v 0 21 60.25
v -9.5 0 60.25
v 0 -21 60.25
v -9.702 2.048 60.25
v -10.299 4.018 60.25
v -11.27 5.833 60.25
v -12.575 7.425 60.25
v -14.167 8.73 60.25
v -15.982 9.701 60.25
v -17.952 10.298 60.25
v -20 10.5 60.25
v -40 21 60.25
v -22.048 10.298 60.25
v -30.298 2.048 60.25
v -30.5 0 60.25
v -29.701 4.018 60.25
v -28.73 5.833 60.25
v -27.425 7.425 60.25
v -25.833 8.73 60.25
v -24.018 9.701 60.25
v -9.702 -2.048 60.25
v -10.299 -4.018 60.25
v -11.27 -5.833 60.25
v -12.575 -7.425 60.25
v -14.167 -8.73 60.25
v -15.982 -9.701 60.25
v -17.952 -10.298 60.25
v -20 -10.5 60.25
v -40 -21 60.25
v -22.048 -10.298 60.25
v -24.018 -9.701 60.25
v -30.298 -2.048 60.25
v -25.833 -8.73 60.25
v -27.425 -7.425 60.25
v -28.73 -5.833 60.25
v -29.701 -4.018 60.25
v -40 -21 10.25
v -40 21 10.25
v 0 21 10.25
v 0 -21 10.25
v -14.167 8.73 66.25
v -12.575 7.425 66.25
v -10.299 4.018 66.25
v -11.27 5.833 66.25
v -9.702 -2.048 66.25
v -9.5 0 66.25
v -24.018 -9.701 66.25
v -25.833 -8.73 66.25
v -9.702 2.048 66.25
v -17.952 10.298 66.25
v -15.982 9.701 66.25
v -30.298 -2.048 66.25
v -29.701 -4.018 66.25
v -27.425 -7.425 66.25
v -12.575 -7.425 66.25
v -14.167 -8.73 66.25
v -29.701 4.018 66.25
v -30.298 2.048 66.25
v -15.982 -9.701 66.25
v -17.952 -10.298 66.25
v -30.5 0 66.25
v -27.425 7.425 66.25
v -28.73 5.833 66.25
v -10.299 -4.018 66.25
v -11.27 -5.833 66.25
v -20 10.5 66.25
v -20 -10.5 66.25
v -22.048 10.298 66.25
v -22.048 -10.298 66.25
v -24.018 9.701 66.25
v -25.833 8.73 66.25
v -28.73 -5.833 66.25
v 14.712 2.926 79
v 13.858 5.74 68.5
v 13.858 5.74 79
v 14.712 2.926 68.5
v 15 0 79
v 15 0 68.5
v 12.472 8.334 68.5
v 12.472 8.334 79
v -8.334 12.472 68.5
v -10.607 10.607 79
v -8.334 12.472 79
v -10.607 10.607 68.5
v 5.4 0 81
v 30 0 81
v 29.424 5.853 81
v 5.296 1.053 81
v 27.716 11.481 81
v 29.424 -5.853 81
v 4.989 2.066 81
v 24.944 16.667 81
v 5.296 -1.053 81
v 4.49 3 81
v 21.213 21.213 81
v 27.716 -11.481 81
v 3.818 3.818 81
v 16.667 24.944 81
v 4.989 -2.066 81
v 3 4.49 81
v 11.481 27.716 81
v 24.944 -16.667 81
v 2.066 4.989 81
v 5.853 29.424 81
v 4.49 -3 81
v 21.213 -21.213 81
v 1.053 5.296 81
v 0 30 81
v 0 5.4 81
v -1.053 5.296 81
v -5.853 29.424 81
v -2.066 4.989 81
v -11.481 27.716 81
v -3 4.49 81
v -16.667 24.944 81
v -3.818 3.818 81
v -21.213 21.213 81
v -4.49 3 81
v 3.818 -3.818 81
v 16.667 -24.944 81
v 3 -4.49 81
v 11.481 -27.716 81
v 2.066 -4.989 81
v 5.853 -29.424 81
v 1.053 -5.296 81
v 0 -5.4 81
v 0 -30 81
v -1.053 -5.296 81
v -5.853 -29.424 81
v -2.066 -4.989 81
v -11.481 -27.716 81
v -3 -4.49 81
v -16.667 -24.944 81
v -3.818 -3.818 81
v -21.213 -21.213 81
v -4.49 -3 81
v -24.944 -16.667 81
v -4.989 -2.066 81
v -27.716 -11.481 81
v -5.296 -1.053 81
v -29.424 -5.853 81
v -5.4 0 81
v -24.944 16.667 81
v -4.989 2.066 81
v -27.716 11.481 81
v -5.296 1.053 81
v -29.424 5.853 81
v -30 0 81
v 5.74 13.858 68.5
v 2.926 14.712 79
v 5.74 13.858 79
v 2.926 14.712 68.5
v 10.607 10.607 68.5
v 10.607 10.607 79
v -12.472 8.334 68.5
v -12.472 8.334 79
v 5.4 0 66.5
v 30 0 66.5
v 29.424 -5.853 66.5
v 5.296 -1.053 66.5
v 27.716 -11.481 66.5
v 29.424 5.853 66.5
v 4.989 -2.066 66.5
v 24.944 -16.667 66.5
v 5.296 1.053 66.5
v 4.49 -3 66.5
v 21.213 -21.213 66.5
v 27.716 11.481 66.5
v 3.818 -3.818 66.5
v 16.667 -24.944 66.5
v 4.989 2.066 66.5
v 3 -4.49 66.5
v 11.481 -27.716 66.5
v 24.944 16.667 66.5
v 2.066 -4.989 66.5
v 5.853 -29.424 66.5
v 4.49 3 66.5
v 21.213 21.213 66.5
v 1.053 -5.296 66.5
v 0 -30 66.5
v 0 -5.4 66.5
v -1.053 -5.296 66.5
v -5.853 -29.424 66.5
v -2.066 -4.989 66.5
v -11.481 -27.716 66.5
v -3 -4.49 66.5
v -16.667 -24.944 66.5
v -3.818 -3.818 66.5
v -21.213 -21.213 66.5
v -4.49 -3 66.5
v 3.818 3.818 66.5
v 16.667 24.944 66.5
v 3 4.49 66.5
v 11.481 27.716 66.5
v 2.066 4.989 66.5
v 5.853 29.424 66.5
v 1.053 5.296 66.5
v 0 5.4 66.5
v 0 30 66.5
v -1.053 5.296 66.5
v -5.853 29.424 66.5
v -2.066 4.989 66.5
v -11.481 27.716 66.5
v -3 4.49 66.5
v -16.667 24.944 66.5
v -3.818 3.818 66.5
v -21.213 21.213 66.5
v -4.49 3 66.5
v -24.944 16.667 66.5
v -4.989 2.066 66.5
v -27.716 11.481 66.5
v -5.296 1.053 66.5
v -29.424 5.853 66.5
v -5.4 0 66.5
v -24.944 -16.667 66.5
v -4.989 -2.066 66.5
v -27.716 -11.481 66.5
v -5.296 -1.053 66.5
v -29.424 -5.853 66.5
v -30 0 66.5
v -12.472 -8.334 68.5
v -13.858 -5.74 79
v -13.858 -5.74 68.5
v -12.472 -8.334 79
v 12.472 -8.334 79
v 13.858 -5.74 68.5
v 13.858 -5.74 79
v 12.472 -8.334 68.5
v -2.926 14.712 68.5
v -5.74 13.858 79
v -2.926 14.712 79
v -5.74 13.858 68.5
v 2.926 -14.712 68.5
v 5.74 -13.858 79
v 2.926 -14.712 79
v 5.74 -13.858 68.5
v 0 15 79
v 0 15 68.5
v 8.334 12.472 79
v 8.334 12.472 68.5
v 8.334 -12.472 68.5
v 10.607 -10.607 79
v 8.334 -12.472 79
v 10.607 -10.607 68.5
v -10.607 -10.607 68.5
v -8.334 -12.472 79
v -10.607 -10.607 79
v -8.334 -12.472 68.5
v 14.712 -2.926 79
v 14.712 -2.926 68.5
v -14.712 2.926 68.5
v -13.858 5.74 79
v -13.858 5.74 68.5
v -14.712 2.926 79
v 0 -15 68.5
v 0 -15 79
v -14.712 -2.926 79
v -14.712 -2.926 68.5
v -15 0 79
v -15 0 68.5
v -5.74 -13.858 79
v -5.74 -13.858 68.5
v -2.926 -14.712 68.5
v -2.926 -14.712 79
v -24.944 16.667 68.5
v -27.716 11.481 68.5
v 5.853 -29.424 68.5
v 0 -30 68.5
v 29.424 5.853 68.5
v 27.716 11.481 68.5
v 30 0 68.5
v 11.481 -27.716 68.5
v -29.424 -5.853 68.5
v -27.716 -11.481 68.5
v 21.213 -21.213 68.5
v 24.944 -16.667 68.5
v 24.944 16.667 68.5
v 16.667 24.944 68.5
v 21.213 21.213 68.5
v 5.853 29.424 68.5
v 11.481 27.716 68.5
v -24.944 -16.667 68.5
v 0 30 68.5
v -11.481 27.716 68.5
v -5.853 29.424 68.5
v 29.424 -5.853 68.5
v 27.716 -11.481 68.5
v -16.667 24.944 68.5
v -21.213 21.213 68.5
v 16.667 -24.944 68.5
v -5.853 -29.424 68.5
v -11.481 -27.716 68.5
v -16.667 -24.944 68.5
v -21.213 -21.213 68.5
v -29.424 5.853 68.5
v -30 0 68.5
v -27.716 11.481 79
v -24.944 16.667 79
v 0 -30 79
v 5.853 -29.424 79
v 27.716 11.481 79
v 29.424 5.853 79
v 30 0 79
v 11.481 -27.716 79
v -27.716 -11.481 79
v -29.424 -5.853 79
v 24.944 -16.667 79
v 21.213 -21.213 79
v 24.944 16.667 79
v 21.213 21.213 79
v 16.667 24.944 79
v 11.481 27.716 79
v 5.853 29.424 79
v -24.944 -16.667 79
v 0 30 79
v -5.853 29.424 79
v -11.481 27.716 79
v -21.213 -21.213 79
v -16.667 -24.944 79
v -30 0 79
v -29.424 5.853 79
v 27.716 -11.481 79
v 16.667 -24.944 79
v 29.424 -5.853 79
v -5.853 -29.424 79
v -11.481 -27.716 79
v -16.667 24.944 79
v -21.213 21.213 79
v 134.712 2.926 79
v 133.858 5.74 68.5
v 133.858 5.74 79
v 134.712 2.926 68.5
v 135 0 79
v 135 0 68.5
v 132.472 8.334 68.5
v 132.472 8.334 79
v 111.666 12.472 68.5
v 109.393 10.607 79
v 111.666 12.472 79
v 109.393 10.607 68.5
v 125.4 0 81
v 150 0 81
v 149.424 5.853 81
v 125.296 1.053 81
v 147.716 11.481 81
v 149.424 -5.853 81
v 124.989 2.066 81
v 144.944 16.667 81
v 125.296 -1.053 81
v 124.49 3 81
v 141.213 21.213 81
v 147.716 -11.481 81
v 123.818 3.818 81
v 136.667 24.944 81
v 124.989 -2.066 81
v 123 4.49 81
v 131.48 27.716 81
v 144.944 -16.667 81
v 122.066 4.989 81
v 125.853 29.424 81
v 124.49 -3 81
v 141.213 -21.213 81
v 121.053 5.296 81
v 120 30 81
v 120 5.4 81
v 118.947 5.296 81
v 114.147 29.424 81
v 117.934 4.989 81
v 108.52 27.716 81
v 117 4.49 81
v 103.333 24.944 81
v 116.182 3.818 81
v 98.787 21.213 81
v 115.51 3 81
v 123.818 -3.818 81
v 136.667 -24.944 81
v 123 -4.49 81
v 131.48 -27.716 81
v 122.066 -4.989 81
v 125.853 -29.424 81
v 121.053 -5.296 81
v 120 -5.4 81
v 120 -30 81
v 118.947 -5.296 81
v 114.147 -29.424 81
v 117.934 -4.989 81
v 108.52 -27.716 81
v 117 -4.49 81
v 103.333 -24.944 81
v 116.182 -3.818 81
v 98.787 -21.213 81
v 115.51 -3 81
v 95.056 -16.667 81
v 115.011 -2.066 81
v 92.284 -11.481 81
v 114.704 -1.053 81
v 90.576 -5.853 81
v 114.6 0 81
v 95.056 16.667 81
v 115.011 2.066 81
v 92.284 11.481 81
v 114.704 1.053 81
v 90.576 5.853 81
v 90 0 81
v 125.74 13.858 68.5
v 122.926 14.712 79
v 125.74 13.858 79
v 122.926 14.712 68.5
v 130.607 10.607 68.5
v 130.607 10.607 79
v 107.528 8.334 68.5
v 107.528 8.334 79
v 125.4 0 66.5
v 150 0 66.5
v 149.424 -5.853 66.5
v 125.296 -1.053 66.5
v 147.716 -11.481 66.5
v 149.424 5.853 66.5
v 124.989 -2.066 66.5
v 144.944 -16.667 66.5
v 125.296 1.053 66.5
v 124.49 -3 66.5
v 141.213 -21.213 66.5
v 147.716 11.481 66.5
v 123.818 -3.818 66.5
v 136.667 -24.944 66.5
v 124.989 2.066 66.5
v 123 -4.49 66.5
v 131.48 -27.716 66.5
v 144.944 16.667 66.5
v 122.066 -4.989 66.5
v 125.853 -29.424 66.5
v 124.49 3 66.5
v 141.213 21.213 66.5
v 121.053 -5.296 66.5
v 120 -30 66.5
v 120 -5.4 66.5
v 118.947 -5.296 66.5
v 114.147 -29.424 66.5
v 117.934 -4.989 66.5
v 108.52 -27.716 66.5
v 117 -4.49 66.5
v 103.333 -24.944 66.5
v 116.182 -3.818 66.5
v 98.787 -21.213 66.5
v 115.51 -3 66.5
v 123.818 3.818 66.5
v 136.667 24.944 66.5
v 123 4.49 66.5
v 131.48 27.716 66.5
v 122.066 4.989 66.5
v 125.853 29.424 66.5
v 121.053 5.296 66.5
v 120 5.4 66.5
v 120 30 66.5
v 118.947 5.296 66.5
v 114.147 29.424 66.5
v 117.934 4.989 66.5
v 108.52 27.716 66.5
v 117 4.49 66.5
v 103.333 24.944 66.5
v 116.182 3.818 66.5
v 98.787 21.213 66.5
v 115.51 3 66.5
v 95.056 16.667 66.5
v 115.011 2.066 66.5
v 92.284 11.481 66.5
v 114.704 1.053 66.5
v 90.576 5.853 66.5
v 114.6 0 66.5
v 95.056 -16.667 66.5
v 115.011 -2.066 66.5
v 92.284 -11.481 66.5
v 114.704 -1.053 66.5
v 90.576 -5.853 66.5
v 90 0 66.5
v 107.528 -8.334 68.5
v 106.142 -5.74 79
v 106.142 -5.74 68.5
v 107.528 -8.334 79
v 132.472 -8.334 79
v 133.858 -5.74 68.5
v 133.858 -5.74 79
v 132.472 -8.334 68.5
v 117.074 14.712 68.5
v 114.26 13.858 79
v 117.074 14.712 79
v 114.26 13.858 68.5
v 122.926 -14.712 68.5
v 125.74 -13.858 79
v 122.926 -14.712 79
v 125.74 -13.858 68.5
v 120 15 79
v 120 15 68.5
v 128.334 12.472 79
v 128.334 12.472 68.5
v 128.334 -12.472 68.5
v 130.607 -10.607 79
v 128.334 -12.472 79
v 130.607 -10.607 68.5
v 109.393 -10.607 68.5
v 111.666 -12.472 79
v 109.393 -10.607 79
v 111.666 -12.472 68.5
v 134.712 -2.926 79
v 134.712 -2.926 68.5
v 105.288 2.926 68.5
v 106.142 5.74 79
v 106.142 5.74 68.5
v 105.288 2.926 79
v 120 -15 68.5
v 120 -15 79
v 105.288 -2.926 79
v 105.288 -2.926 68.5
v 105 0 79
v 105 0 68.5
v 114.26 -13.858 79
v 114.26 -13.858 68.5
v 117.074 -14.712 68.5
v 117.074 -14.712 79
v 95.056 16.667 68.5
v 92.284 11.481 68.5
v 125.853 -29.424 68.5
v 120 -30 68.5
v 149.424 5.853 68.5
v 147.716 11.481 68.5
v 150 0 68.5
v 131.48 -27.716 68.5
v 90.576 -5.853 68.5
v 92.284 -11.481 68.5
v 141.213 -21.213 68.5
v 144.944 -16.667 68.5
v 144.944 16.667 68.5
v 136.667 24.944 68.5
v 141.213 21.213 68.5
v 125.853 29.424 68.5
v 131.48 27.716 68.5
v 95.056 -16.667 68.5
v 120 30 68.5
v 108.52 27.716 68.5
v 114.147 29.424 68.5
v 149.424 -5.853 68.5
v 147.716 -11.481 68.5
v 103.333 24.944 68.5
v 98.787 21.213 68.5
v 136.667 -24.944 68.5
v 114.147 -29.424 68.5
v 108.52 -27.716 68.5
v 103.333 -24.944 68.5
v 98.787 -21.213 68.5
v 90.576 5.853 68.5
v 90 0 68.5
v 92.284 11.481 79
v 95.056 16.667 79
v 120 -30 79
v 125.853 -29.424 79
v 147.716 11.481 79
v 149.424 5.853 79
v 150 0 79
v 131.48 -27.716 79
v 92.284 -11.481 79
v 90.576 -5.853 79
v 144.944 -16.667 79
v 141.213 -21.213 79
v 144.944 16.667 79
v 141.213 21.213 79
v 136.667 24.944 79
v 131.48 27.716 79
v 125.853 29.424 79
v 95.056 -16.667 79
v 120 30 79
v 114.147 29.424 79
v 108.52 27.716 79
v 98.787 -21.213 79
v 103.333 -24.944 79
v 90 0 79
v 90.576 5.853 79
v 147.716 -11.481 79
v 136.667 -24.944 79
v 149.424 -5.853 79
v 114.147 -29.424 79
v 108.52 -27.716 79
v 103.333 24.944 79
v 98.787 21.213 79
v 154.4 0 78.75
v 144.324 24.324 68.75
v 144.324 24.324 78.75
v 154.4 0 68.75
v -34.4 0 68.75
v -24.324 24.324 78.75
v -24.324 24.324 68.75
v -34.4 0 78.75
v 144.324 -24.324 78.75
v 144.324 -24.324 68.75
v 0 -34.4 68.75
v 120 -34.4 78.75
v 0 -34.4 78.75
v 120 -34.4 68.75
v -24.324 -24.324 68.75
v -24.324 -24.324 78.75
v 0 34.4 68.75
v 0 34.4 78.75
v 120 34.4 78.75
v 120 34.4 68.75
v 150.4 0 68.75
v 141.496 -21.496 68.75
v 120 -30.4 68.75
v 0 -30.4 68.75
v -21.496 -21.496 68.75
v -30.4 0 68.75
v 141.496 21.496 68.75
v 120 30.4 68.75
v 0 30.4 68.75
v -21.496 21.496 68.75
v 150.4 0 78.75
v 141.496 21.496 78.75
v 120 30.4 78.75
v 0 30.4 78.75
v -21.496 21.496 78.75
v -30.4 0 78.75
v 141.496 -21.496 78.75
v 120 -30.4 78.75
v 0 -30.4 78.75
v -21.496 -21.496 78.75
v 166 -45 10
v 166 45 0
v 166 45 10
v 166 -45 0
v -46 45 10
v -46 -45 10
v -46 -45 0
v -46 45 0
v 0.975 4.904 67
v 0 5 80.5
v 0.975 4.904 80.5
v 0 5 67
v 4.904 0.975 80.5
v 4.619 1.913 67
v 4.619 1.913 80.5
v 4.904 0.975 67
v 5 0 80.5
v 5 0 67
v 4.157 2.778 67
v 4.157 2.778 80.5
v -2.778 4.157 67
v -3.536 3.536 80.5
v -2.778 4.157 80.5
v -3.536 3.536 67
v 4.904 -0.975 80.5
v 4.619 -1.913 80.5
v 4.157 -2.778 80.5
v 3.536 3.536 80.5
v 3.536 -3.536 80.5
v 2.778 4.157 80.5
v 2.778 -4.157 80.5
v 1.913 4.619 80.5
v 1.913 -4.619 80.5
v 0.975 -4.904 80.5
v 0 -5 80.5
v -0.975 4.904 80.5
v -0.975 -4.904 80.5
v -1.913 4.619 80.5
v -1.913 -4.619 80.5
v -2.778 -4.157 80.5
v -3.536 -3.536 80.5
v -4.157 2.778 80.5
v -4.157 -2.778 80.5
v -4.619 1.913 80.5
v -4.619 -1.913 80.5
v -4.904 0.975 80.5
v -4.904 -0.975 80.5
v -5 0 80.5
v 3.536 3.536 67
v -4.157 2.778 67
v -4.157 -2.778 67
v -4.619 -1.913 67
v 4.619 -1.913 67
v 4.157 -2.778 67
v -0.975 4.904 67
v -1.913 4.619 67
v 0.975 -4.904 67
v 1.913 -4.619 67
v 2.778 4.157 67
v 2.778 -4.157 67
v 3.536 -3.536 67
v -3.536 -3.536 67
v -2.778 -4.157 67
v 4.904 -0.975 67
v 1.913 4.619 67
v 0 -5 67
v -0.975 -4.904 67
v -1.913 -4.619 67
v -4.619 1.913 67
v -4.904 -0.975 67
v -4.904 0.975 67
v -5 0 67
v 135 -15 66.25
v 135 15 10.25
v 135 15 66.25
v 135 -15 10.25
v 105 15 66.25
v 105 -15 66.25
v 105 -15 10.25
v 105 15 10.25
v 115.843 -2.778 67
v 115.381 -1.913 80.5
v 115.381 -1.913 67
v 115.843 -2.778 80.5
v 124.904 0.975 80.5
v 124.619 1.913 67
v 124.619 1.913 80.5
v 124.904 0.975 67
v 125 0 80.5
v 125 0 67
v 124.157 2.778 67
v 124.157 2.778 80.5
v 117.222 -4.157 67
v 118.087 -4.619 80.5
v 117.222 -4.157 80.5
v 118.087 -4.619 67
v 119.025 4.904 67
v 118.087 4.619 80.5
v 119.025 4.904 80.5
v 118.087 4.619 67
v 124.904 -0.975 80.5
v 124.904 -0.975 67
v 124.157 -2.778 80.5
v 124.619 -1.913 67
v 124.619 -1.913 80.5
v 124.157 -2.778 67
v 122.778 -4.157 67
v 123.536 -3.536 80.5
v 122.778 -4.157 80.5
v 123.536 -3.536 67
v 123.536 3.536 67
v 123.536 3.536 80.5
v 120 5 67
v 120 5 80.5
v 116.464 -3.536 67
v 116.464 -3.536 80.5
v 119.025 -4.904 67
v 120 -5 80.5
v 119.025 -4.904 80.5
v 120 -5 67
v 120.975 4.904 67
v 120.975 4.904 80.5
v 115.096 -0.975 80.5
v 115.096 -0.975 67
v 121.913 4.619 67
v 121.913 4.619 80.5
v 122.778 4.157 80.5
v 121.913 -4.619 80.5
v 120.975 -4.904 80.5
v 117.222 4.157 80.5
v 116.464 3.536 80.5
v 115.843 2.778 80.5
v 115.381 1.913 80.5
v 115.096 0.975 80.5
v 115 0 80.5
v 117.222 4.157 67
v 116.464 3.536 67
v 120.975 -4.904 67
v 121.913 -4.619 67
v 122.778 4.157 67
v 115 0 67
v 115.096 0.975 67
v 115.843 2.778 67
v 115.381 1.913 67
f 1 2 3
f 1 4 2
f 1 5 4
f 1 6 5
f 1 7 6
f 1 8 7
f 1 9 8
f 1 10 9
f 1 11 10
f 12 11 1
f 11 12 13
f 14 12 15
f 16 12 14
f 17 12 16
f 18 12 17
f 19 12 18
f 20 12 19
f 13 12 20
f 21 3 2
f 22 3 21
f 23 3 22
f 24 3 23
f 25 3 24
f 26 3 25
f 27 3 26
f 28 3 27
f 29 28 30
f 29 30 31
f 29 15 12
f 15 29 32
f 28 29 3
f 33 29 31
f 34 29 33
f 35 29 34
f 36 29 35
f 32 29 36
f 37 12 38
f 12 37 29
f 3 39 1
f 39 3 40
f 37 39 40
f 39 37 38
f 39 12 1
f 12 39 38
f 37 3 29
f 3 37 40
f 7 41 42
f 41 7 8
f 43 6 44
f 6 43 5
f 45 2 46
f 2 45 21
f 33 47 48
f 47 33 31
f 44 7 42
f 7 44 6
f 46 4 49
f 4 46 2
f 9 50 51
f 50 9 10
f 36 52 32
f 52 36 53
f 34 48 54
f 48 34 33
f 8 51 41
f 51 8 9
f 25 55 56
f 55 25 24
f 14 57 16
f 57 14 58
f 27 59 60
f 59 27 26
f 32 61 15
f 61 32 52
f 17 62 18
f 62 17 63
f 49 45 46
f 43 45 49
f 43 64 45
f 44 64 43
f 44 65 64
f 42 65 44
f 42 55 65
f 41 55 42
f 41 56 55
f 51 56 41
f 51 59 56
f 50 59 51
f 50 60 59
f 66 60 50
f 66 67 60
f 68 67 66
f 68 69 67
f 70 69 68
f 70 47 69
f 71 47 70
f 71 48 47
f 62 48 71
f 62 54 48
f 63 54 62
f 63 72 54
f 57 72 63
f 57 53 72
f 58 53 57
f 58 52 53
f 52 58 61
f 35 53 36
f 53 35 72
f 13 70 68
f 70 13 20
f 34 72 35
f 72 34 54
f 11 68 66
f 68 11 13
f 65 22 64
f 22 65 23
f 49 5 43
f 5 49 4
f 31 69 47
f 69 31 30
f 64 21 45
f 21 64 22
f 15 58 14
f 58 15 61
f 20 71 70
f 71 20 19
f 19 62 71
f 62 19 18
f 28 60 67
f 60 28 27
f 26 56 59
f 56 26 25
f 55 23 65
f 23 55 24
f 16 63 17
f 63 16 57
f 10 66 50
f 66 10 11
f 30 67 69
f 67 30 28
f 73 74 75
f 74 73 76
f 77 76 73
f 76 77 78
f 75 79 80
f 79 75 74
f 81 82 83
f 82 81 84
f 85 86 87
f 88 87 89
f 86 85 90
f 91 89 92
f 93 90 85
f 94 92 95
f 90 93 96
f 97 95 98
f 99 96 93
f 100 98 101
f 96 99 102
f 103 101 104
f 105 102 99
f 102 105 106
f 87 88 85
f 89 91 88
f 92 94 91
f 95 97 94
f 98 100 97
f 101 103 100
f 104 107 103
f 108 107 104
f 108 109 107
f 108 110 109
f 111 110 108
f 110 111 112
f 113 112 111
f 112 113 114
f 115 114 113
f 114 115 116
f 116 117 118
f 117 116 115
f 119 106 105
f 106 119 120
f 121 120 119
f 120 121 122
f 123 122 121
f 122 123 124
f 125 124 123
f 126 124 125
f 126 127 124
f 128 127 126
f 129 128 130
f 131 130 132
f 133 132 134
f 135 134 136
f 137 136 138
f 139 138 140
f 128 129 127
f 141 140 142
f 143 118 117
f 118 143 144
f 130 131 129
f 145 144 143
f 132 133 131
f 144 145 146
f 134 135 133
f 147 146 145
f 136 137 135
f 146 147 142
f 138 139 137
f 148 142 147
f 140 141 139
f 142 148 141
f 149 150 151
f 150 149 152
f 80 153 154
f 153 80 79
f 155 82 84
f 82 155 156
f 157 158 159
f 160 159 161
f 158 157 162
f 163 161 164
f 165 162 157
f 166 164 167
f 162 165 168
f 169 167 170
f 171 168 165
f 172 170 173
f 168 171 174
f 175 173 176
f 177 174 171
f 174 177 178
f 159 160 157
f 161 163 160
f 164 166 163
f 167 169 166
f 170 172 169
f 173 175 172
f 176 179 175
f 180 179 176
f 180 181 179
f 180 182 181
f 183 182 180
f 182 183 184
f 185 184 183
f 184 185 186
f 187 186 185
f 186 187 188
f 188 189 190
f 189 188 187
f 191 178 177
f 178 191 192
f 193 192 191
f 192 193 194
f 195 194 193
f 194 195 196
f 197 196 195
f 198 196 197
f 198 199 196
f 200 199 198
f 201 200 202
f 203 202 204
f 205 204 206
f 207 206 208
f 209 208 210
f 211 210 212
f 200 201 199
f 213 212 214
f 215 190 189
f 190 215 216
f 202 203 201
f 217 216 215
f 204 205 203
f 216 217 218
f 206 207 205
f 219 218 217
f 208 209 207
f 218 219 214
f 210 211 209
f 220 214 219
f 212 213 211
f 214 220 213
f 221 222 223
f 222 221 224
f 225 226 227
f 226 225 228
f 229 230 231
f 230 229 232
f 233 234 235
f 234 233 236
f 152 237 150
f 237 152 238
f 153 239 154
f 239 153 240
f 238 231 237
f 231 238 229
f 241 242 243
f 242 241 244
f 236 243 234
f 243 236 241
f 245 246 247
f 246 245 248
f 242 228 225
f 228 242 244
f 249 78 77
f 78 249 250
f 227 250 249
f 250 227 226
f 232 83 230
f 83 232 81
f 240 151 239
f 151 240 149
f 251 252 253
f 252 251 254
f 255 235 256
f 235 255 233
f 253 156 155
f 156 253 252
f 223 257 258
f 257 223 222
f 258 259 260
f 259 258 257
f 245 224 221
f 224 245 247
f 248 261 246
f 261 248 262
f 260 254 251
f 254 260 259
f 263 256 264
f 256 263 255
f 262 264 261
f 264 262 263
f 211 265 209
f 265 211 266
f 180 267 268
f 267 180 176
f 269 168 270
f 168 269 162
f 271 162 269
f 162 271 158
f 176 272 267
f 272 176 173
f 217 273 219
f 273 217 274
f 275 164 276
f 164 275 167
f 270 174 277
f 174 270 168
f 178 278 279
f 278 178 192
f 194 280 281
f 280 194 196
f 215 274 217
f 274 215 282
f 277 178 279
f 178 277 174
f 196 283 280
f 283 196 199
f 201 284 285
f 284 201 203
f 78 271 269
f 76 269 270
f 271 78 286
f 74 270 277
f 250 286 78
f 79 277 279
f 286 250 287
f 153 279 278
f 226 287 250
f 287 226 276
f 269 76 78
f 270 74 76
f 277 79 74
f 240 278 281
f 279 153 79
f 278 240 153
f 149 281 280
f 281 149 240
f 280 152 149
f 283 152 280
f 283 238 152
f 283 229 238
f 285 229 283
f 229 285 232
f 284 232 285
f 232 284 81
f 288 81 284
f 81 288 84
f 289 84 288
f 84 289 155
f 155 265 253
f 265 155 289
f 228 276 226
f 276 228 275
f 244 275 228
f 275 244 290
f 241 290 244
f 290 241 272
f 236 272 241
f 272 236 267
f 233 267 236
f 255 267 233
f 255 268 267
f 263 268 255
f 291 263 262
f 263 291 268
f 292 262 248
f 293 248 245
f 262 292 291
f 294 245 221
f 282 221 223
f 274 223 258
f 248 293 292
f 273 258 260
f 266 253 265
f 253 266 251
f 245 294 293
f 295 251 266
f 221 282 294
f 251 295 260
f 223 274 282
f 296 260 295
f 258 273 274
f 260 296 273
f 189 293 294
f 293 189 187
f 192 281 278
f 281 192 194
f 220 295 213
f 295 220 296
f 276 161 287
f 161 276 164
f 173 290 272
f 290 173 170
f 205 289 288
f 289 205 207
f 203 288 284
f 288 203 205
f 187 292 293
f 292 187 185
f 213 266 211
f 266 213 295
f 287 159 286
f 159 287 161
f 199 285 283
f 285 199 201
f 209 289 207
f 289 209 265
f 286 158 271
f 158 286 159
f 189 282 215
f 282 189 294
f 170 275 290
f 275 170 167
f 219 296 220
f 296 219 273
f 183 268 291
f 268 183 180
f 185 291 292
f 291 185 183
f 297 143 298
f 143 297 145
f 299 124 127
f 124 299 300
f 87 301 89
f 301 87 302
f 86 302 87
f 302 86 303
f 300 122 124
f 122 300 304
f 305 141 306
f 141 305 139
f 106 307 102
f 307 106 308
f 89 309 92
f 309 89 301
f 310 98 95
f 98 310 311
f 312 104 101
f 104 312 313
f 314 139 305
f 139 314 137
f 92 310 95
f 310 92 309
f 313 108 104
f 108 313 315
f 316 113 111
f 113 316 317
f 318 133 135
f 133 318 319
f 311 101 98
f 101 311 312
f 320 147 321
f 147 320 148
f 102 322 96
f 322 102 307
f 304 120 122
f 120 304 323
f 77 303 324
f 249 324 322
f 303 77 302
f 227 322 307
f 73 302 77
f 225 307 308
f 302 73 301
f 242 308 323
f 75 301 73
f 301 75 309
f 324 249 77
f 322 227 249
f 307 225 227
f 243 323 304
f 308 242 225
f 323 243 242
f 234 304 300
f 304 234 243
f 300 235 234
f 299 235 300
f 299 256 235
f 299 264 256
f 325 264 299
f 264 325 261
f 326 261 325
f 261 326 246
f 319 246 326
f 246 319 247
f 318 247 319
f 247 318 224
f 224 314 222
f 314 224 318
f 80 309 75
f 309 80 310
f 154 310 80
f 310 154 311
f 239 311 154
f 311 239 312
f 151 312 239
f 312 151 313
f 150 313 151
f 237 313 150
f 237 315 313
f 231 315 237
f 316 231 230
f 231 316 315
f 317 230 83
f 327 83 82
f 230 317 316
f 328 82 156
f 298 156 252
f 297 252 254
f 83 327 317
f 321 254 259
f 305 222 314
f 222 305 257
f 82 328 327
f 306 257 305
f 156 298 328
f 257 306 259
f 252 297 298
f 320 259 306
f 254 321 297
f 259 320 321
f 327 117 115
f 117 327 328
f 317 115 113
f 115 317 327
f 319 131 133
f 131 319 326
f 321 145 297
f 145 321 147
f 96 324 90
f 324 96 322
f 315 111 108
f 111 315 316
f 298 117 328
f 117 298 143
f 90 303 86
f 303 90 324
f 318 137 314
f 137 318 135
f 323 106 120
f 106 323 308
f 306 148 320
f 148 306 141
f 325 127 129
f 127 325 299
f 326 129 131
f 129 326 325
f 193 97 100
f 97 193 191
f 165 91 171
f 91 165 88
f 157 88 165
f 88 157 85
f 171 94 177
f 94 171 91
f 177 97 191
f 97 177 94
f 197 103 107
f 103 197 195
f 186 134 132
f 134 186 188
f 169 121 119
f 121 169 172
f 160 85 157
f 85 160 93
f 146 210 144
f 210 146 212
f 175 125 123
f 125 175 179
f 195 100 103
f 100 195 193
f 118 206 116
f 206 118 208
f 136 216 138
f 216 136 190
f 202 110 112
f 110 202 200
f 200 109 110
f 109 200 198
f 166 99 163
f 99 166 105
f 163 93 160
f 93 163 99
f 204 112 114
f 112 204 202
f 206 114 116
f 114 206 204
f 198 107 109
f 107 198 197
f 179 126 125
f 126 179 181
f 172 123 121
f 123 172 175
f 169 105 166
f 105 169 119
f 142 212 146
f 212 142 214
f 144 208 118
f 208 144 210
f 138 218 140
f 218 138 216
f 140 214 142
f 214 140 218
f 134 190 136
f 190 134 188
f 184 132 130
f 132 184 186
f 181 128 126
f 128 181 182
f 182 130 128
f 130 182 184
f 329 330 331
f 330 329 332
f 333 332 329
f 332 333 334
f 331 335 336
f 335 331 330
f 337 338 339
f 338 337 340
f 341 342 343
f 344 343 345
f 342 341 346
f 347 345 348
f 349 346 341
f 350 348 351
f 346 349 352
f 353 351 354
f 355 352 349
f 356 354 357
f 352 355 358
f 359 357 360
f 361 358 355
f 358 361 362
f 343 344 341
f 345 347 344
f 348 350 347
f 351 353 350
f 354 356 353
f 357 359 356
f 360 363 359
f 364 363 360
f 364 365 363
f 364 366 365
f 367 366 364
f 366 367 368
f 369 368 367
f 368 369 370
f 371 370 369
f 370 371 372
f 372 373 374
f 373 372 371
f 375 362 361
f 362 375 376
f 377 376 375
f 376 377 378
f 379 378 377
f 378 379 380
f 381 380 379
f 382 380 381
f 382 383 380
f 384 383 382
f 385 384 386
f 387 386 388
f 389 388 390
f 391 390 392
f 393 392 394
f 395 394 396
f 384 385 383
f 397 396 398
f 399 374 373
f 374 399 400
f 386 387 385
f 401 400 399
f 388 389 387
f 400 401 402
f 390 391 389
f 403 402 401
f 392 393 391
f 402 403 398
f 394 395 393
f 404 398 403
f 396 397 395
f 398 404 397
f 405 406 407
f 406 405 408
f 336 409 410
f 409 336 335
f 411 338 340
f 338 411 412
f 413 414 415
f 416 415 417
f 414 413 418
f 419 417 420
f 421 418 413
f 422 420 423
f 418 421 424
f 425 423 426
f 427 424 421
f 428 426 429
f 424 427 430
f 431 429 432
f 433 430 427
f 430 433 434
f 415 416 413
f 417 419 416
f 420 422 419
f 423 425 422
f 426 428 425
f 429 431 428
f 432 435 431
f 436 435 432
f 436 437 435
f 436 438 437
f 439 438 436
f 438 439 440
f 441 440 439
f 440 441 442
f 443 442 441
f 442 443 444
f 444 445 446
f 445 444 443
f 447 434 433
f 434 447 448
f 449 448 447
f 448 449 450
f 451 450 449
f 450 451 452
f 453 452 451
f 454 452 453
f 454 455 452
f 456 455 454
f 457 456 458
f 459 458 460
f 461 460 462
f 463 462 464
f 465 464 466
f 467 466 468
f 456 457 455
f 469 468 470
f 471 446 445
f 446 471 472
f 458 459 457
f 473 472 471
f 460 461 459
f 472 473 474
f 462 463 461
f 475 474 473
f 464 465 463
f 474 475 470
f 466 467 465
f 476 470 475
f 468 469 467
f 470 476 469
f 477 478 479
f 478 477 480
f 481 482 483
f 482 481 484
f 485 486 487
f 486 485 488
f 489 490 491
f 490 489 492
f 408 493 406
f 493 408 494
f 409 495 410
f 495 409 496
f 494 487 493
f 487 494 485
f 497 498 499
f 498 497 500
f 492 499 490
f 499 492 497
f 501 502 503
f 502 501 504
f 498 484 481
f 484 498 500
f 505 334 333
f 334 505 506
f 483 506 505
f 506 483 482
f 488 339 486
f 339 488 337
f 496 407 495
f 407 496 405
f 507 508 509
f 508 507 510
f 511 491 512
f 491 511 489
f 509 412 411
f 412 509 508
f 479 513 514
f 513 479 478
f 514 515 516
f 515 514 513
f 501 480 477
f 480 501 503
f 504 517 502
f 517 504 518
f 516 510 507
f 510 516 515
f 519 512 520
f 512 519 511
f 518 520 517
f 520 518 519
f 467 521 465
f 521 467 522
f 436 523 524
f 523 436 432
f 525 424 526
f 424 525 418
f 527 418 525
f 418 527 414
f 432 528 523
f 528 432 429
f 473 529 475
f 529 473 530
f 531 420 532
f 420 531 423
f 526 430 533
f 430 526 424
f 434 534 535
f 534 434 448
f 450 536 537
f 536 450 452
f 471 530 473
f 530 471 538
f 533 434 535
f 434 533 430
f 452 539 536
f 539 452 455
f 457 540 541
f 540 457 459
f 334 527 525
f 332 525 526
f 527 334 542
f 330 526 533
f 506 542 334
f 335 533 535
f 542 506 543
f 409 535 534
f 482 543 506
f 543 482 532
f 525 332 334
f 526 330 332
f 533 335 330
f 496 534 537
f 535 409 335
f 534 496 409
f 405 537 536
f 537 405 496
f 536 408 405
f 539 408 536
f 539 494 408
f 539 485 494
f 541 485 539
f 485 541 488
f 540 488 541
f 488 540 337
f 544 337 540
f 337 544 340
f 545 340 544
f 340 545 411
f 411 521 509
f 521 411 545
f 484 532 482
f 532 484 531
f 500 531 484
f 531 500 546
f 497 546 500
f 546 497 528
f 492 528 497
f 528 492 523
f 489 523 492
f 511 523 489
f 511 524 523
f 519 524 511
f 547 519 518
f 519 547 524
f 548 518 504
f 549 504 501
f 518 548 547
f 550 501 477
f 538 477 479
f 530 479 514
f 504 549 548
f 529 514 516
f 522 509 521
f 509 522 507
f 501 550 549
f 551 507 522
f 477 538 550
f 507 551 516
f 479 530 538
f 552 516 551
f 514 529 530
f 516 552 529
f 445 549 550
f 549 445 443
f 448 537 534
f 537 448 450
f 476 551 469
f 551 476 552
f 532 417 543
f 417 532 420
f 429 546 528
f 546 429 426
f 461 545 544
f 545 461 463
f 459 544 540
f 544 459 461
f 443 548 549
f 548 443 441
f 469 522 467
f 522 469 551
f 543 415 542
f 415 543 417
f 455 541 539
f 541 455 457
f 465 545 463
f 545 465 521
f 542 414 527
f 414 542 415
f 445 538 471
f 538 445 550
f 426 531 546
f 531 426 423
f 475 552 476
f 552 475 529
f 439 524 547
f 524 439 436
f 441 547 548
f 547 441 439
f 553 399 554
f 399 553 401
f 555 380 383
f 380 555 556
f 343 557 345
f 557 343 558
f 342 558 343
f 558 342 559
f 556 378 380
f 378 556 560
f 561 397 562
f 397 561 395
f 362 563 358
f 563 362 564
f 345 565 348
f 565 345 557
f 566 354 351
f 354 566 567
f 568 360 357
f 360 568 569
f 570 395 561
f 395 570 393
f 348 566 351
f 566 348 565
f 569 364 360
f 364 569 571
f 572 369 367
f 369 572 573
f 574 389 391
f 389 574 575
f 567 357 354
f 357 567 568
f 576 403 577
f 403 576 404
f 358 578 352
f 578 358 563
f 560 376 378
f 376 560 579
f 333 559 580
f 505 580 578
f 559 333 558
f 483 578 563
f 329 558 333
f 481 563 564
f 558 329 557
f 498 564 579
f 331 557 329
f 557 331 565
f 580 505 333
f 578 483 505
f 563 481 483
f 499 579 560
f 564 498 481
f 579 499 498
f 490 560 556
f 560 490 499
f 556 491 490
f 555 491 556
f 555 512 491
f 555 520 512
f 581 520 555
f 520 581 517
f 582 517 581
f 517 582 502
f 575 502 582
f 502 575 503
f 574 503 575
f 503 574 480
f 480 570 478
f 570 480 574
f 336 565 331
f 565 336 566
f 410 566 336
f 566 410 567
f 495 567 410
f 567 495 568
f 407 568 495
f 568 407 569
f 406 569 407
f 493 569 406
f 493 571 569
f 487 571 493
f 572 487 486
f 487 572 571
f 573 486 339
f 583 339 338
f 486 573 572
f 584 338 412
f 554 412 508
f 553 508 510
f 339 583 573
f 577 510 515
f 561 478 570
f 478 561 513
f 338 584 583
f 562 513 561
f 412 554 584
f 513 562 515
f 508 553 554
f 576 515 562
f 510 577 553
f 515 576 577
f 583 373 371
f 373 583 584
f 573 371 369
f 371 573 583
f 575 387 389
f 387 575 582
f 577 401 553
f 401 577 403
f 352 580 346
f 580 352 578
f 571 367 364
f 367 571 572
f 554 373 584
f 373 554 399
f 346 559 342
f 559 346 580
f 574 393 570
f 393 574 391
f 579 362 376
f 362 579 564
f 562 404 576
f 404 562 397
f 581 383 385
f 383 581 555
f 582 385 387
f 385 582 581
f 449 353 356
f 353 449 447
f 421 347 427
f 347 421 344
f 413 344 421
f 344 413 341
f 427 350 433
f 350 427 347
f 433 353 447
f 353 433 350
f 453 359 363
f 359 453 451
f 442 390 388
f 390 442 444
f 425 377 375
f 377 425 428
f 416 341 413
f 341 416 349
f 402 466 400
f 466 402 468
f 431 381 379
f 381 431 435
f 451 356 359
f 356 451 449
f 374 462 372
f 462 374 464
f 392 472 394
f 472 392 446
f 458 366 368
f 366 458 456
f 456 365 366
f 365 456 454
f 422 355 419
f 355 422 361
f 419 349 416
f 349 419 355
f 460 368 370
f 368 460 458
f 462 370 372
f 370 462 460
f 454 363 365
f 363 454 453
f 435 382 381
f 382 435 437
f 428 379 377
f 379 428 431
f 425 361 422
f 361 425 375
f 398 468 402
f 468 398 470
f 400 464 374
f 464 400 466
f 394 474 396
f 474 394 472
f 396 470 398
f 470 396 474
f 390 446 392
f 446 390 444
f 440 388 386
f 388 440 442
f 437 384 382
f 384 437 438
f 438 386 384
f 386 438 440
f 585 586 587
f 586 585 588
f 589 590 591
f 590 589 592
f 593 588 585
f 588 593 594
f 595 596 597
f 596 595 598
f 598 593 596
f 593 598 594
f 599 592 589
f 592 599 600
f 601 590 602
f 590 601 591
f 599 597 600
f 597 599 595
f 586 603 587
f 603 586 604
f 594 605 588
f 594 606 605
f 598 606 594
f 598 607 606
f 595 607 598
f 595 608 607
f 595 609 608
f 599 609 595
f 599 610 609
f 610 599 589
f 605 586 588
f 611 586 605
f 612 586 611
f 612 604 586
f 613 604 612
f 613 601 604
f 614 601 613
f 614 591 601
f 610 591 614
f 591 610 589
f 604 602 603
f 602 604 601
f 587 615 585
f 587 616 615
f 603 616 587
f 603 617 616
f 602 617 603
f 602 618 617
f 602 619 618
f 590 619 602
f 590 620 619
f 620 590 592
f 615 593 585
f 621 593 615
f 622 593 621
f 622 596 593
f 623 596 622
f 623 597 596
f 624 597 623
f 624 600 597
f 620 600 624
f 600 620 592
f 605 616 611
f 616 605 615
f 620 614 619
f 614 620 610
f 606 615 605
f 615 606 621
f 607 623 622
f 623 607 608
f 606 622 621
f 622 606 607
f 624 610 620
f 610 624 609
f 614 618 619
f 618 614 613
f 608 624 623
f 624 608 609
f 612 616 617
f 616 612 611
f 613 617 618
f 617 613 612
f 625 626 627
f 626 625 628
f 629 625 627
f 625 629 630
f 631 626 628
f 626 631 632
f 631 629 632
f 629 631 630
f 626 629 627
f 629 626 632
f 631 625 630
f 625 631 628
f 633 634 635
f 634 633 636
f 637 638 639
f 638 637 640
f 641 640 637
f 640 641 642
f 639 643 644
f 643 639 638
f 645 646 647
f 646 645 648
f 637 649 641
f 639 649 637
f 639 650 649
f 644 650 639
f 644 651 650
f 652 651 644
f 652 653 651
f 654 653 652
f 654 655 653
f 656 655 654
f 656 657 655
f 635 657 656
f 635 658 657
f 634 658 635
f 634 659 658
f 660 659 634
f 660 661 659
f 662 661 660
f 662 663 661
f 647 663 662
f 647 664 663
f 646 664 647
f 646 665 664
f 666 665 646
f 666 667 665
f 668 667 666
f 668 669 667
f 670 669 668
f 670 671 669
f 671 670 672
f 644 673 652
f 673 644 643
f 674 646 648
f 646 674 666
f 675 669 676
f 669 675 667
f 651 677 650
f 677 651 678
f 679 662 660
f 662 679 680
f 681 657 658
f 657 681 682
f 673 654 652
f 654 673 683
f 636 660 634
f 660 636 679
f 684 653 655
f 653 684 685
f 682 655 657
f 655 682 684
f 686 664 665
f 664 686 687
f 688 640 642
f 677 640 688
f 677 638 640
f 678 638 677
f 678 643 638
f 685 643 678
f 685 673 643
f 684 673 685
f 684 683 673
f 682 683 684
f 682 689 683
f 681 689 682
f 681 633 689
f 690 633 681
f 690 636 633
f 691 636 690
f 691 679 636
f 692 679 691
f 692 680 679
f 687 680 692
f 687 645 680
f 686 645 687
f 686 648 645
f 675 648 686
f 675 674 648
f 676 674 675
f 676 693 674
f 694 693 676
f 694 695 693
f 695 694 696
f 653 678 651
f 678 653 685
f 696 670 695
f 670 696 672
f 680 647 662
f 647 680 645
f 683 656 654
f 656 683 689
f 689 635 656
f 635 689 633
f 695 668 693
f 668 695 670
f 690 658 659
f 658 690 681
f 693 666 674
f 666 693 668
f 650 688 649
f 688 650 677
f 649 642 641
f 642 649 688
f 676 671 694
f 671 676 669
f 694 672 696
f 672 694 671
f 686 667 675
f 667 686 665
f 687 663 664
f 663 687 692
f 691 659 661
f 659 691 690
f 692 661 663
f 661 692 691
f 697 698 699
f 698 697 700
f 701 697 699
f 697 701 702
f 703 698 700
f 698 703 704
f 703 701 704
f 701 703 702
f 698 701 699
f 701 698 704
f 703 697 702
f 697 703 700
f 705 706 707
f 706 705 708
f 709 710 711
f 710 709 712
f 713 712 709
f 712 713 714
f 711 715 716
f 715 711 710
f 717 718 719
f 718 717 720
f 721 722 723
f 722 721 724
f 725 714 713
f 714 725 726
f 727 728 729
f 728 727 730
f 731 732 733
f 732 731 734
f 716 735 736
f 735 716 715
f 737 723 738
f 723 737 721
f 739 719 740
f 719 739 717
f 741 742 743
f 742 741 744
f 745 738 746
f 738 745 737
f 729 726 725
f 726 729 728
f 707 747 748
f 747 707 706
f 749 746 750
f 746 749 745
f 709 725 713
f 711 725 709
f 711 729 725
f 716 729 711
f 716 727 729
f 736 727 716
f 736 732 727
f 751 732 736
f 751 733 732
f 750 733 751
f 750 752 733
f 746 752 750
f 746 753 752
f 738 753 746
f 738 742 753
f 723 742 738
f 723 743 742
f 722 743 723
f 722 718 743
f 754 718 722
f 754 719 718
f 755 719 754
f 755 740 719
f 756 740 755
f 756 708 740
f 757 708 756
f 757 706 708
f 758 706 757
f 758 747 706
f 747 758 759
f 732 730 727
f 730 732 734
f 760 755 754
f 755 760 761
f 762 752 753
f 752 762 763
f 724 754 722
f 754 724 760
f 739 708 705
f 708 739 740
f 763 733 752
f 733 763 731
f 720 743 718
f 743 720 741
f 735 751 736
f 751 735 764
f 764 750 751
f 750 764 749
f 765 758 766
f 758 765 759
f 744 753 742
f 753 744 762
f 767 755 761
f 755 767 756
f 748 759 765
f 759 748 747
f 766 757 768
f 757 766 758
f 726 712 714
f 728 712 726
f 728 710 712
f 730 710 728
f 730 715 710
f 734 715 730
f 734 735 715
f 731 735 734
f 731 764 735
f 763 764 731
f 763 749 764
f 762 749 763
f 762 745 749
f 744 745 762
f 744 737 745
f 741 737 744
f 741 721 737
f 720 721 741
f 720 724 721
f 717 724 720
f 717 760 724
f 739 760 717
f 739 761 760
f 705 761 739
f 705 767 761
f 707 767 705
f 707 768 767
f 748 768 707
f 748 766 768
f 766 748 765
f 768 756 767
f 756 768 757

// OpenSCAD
$fn = 32;

// ------------------------------------------------------------------------
// Motor belt drive: span 120 mm, pulleys d60, belt 10 mm wide
// Every part is its own module, assembly() places every instance.
// ------------------------------------------------------------------------

// --- part 1 ---
module base_plate() {
  difference() {
    translate([-106, -45, 0]) cube([212, 90, 10]);
  }
}

// --- part 2 ---
module motor() {
  union() {
    translate([-25, -21, 0]) cube([50, 42, 40]);
    translate([28, 0, 20]) rotate([0, 90, 0]) cylinder(h = 6, d = 21, center = true);
  }
}

// --- part 3 ---
module drive_shaft() {
  translate([0, 0, -6.75]) cylinder(h = 13.5, d = 10);
}

// --- part 4 ---
module pulley_drive() {
  difference() {
    union() {
      cylinder(h = 14.5, d = 30);
      cylinder(h = 2, d = 60);
      translate([0, 0, 12.5]) cylinder(h = 2, d = 60);
    }
    translate([0, 0, -1]) cylinder(h = 16.5, d = 10.8);
  }
}

// --- part 5 ---
module idler_post() {
  translate([-15, -15, 0]) cube([30, 30, 56]);
}

// --- part 6 ---
module driven_shaft() {
  translate([0, 0, -6.75]) cylinder(h = 13.5, d = 10);
}

// --- part 7 ---
module pulley_driven() {
  difference() {
    union() {
      cylinder(h = 14.5, d = 30);
      cylinder(h = 2, d = 60);
      translate([0, 0, 12.5]) cylinder(h = 2, d = 60);
    }
    translate([0, 0, -1]) cylinder(h = 16.5, d = 10.8);
  }
}

// --- part 8 ---
module drive_belt() {
  difference() {
    linear_extrude(height = 10) polygon(points = concat([for (a = [90 : 45 : 270]) [34.4 * cos(a), 34.4 * sin(a)]], [for (a = [270 : 45 : 450]) [120 + 34.4 * cos(a), 34.4 * sin(a)]]));
    translate([0, 0, -1]) linear_extrude(height = 12) polygon(points = concat([for (a = [90 : 45 : 270]) [30.4 * cos(a), 30.4 * sin(a)]], [for (a = [270 : 45 : 450]) [120 + 30.4 * cos(a), 30.4 * sin(a)]]));
  }
}

// --- assembly ---
module assembly() {
  color([0.80, 0.24, 0.20]) translate([60, 0, 0]) rotate([0, 0, 0]) base_plate();
  color([0.20, 0.45, 0.75]) translate([0, 0, 35.25]) rotate([0, 270, 0]) motor();
  color([0.25, 0.62, 0.32]) translate([0, 0, 73.75]) rotate([0, 0, 0]) drive_shaft();
  color([0.92, 0.70, 0.18]) translate([0, 0, 66.5]) rotate([0, 0, 0]) pulley_drive();
  color([0.58, 0.35, 0.70]) translate([120, 0, 10.25]) rotate([0, 0, 0]) idler_post();
  color([0.16, 0.66, 0.66]) translate([120, 0, 73.75]) rotate([0, 0, 0]) driven_shaft();
  color([0.85, 0.48, 0.18]) translate([120, 0, 66.5]) rotate([0, 0, 0]) pulley_driven();
  color([0.55, 0.60, 0.65]) translate([0, 0, 68.75]) rotate([0, 0, 0]) drive_belt();
}

assembly();
